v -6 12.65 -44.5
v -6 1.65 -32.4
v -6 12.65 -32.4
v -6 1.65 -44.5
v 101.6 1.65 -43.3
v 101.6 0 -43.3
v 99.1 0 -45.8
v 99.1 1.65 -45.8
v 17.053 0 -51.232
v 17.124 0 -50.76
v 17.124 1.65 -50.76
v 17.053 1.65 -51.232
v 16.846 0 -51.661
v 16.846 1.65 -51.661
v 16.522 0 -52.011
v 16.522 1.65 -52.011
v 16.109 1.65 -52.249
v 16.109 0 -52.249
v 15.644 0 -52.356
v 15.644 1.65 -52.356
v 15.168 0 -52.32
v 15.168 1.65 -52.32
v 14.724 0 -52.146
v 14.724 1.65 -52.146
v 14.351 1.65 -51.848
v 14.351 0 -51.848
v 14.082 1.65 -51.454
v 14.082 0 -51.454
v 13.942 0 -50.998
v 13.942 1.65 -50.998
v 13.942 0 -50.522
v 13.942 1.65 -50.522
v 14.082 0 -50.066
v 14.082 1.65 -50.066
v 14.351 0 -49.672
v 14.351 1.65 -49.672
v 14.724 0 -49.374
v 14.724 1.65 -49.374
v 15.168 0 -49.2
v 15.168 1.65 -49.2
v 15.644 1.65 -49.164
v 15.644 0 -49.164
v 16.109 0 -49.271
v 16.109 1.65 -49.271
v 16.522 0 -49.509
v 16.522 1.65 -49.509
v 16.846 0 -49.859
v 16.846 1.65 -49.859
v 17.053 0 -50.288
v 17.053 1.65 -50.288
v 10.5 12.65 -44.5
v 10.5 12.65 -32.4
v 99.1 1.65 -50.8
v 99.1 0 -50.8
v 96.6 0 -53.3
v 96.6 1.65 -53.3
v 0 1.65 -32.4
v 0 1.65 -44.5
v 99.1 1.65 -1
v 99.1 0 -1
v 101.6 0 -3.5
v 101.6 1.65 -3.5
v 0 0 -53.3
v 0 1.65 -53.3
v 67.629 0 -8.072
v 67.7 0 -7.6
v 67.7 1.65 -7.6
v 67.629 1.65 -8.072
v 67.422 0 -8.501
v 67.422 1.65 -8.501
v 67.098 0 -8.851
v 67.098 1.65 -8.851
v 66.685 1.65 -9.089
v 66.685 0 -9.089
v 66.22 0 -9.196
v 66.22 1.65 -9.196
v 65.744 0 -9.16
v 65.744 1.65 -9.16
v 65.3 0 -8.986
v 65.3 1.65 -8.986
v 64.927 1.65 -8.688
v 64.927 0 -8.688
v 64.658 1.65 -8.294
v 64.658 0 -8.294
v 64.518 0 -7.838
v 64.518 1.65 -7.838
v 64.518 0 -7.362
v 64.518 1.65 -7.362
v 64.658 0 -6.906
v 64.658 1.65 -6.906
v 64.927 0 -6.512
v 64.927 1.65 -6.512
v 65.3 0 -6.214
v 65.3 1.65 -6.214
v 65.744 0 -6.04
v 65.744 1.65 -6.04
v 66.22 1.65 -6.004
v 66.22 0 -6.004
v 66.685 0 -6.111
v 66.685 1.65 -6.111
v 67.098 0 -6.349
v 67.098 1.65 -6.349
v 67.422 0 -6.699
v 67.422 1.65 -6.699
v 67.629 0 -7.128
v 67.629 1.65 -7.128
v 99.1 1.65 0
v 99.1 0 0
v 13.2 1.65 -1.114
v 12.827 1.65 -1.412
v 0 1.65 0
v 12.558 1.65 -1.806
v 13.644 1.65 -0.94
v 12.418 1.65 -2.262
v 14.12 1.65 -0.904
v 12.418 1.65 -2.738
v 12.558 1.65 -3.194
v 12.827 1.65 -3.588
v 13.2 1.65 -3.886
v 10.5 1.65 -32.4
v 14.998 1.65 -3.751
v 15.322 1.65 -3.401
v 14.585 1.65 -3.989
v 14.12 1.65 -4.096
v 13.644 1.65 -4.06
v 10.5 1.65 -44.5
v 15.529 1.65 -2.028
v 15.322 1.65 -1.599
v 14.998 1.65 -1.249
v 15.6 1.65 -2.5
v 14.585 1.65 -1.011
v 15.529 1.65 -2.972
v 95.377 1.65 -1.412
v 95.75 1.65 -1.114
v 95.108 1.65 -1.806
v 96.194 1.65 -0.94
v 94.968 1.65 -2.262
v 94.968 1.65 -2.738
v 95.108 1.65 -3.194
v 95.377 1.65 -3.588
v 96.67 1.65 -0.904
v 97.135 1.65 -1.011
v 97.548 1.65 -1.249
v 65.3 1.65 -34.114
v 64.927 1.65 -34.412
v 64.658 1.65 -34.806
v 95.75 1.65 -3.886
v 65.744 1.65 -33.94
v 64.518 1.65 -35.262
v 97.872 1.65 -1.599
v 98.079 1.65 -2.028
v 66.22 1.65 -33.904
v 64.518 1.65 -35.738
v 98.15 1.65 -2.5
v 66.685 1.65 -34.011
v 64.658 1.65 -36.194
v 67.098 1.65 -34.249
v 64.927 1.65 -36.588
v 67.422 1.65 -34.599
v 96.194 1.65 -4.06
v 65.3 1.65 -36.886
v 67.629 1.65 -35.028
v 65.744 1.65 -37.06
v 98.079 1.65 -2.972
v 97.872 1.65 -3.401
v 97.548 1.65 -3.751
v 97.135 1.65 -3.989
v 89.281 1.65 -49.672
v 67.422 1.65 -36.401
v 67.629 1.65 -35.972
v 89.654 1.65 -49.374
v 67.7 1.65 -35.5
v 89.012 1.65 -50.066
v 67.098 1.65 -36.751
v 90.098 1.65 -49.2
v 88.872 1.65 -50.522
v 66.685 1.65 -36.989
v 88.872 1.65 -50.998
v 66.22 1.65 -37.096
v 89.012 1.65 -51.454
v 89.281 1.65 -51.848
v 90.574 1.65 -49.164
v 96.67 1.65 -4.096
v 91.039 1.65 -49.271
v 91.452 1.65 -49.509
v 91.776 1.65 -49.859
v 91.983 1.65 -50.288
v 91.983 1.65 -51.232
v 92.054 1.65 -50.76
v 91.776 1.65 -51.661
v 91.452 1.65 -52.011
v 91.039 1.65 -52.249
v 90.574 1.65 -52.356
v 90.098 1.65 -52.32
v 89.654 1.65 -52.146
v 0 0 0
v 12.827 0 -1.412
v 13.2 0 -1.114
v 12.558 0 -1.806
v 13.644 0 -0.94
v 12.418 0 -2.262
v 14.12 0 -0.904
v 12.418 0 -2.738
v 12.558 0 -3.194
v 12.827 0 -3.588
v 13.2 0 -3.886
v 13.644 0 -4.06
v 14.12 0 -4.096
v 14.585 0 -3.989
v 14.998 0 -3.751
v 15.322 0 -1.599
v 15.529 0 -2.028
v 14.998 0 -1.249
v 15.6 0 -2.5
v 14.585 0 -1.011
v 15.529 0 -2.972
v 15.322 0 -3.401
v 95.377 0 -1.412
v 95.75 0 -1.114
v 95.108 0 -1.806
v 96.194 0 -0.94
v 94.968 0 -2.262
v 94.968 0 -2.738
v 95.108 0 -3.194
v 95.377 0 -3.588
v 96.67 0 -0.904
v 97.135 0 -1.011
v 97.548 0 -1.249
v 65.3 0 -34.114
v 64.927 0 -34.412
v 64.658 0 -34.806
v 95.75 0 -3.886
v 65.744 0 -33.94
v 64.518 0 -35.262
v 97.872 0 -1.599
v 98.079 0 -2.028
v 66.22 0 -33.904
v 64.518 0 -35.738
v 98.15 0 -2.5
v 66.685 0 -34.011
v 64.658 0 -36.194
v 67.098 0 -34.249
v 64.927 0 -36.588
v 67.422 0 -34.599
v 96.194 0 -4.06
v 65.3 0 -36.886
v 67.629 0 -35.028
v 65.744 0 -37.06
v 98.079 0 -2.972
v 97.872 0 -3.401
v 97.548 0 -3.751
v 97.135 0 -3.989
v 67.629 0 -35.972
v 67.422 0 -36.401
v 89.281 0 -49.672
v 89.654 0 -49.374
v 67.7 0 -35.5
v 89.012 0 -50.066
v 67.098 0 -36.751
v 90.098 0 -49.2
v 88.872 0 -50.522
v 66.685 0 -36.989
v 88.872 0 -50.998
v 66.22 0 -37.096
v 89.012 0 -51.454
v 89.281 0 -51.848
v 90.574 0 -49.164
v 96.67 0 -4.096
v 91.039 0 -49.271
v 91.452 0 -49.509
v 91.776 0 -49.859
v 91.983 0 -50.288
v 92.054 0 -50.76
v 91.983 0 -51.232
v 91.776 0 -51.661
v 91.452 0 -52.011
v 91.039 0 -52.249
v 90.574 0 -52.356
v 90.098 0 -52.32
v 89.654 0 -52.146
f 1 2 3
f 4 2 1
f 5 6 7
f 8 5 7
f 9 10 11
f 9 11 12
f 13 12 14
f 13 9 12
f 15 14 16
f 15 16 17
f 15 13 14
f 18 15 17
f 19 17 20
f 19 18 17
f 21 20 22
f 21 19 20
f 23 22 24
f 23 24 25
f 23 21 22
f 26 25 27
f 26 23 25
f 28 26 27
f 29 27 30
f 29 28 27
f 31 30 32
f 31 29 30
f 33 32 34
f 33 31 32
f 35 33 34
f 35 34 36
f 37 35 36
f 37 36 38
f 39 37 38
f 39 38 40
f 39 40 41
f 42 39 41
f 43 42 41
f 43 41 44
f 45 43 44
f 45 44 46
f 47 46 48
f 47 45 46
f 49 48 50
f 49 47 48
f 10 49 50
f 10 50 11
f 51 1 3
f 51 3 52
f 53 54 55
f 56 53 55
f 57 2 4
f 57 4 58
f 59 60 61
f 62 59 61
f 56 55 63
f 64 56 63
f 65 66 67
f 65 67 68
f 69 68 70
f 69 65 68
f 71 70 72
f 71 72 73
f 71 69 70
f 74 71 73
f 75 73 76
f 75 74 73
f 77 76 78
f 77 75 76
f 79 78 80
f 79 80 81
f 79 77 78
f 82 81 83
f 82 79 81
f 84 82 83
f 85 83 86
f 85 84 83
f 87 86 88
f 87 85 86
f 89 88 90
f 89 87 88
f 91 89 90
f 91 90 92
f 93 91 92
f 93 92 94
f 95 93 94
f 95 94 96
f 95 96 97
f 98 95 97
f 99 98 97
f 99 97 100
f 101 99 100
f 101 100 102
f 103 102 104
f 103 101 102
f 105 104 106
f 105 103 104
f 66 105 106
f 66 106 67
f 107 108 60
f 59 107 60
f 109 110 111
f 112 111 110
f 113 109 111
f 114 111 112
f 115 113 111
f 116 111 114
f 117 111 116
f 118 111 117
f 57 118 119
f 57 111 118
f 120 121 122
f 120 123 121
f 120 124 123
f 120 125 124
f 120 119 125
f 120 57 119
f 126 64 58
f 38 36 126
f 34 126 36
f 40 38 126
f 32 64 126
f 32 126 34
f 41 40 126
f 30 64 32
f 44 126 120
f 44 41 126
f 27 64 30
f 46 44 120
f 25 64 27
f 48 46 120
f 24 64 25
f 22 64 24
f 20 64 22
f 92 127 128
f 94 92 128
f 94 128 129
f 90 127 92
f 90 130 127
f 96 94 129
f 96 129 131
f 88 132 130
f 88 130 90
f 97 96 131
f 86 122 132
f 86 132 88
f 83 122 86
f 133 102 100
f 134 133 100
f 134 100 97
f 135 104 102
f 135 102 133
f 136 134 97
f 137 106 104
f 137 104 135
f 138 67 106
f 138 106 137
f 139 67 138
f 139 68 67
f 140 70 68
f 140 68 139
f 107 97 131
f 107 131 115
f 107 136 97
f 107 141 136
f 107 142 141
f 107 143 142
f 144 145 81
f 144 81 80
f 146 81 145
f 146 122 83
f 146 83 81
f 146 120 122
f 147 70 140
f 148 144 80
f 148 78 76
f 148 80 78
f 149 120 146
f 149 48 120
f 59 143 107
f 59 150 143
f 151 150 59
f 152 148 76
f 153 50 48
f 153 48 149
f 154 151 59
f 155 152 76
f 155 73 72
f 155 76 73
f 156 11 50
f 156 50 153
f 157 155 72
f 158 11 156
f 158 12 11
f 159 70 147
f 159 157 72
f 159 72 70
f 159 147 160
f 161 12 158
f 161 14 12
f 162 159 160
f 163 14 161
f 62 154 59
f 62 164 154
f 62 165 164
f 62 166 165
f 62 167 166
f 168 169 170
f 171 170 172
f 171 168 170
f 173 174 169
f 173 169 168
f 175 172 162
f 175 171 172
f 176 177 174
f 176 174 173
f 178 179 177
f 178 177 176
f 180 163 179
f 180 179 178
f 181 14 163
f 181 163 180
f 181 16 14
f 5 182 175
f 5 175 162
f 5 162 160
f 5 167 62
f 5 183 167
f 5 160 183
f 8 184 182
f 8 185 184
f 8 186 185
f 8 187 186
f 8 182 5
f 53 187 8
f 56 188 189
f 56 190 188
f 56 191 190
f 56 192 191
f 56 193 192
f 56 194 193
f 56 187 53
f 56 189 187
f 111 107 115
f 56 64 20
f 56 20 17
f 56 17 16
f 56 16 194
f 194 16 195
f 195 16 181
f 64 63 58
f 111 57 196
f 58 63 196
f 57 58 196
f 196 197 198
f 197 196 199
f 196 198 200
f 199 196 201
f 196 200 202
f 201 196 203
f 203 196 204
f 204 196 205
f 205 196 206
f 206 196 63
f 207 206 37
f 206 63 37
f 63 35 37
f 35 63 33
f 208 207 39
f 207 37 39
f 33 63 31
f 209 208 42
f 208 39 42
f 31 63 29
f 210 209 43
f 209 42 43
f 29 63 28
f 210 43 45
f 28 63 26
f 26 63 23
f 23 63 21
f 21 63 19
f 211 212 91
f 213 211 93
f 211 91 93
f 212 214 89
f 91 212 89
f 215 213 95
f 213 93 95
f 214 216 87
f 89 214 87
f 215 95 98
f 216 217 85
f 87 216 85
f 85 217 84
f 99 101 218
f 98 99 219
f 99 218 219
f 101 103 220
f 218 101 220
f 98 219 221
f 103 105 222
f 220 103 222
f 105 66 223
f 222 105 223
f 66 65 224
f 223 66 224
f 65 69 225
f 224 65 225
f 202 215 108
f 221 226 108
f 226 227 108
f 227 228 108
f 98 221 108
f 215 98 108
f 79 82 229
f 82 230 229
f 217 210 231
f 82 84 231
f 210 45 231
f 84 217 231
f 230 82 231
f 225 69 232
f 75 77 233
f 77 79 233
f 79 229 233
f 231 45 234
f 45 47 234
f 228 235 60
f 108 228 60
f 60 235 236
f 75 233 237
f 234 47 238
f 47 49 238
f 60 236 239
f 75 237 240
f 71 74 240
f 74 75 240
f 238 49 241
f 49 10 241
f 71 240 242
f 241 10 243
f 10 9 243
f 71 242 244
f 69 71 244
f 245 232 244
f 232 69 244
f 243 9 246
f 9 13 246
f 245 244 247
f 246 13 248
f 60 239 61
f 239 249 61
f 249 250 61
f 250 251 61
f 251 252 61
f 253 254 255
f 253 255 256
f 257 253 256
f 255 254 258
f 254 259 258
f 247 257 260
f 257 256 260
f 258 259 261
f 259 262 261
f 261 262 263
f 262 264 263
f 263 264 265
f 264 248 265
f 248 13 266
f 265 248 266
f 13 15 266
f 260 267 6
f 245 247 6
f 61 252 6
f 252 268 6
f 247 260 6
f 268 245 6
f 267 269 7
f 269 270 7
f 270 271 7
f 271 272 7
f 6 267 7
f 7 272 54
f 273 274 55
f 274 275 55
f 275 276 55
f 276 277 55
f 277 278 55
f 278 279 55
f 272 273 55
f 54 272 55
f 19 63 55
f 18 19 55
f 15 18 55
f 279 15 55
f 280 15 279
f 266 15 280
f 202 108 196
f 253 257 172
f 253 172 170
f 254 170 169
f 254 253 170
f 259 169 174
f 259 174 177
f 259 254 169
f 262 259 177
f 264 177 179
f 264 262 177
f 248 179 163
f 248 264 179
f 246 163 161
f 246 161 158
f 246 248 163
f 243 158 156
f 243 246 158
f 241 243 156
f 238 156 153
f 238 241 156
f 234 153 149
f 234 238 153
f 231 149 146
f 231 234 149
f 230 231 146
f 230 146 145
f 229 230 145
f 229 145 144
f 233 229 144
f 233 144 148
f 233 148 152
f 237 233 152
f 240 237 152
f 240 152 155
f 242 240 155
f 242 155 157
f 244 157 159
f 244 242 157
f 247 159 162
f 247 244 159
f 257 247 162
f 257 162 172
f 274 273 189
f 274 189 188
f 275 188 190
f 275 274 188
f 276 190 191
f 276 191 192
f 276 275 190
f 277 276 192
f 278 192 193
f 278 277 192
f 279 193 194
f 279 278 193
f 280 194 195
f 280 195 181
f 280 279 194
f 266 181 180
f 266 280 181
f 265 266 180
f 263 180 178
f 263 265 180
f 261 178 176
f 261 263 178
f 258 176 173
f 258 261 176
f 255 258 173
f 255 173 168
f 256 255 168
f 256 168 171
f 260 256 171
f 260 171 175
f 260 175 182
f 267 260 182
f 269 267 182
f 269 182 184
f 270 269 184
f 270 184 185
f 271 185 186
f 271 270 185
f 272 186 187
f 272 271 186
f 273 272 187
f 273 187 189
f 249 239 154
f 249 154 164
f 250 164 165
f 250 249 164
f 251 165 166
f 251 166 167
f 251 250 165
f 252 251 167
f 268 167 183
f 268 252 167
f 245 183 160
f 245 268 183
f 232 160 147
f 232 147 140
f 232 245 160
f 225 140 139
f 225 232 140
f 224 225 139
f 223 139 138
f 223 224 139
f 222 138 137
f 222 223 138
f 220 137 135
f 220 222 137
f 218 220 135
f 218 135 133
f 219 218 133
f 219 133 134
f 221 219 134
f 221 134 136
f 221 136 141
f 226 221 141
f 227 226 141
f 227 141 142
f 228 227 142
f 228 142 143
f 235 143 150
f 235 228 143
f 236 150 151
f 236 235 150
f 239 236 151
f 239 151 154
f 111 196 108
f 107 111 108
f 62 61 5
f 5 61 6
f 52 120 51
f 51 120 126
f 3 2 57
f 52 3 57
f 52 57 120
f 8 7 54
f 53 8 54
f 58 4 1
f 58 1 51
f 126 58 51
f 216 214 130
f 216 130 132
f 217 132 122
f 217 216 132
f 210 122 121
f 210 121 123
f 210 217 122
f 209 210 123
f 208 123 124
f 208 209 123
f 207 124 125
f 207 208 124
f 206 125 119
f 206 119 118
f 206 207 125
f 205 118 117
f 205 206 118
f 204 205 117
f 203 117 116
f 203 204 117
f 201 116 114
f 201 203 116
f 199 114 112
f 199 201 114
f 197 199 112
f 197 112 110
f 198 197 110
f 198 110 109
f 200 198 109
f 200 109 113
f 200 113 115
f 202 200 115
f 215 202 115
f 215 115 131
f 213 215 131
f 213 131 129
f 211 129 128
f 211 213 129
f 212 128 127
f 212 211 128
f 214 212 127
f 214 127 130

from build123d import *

# Parameters (mm, degrees)
SKETCH1_R           = 1.6
BOSS_EXTRUDE1_DEPTH = 1.65
SKETCH2_W           = 16.5
SKETCH2_H           = 12.1
BOSS_EXTRUDE2_DEPTH = 11


with BuildPart() as part:
    # Sketch1 → Boss-Extrude1 (new body)
    with BuildSketch(Plane(origin=(0, 0, 0), x_dir=(1, 0, 0), z_dir=(0, 1, 0))):
        Polygon((99.1, 0), (99.1, 1), (101.6, 3.5), (101.6, 43.3), (99.1, 45.8), (99.1, 50.8), (96.6, 53.3), (0, 53.3), (0, 0), align=None)
        with Locations((15.524, 50.76)):
            Circle(SKETCH1_R, mode=Mode.SUBTRACT)
        with Locations((14, 2.5)):
            Circle(SKETCH1_R, mode=Mode.SUBTRACT)
        with Locations((96.55, 2.5)):
            Circle(SKETCH1_R, mode=Mode.SUBTRACT)
        with Locations((90.454, 50.76)):
            Circle(SKETCH1_R, mode=Mode.SUBTRACT)
        with Locations((66.1, 35.5)):
            Circle(SKETCH1_R, mode=Mode.SUBTRACT)
        with Locations((66.1, 7.6)):
            Circle(SKETCH1_R, mode=Mode.SUBTRACT)
    extrude(amount=BOSS_EXTRUDE1_DEPTH)

    # Sketch2 → Boss-Extrude2 (add)
    with BuildSketch(Plane(origin=(0, 1.65, 0), x_dir=(1, 0, 0), z_dir=(0, 1, 0))):
        with Locations((2.25, 38.45)):
            Rectangle(SKETCH2_W, SKETCH2_H)
    extrude(amount=BOSS_EXTRUDE2_DEPTH)


solid = part.part
